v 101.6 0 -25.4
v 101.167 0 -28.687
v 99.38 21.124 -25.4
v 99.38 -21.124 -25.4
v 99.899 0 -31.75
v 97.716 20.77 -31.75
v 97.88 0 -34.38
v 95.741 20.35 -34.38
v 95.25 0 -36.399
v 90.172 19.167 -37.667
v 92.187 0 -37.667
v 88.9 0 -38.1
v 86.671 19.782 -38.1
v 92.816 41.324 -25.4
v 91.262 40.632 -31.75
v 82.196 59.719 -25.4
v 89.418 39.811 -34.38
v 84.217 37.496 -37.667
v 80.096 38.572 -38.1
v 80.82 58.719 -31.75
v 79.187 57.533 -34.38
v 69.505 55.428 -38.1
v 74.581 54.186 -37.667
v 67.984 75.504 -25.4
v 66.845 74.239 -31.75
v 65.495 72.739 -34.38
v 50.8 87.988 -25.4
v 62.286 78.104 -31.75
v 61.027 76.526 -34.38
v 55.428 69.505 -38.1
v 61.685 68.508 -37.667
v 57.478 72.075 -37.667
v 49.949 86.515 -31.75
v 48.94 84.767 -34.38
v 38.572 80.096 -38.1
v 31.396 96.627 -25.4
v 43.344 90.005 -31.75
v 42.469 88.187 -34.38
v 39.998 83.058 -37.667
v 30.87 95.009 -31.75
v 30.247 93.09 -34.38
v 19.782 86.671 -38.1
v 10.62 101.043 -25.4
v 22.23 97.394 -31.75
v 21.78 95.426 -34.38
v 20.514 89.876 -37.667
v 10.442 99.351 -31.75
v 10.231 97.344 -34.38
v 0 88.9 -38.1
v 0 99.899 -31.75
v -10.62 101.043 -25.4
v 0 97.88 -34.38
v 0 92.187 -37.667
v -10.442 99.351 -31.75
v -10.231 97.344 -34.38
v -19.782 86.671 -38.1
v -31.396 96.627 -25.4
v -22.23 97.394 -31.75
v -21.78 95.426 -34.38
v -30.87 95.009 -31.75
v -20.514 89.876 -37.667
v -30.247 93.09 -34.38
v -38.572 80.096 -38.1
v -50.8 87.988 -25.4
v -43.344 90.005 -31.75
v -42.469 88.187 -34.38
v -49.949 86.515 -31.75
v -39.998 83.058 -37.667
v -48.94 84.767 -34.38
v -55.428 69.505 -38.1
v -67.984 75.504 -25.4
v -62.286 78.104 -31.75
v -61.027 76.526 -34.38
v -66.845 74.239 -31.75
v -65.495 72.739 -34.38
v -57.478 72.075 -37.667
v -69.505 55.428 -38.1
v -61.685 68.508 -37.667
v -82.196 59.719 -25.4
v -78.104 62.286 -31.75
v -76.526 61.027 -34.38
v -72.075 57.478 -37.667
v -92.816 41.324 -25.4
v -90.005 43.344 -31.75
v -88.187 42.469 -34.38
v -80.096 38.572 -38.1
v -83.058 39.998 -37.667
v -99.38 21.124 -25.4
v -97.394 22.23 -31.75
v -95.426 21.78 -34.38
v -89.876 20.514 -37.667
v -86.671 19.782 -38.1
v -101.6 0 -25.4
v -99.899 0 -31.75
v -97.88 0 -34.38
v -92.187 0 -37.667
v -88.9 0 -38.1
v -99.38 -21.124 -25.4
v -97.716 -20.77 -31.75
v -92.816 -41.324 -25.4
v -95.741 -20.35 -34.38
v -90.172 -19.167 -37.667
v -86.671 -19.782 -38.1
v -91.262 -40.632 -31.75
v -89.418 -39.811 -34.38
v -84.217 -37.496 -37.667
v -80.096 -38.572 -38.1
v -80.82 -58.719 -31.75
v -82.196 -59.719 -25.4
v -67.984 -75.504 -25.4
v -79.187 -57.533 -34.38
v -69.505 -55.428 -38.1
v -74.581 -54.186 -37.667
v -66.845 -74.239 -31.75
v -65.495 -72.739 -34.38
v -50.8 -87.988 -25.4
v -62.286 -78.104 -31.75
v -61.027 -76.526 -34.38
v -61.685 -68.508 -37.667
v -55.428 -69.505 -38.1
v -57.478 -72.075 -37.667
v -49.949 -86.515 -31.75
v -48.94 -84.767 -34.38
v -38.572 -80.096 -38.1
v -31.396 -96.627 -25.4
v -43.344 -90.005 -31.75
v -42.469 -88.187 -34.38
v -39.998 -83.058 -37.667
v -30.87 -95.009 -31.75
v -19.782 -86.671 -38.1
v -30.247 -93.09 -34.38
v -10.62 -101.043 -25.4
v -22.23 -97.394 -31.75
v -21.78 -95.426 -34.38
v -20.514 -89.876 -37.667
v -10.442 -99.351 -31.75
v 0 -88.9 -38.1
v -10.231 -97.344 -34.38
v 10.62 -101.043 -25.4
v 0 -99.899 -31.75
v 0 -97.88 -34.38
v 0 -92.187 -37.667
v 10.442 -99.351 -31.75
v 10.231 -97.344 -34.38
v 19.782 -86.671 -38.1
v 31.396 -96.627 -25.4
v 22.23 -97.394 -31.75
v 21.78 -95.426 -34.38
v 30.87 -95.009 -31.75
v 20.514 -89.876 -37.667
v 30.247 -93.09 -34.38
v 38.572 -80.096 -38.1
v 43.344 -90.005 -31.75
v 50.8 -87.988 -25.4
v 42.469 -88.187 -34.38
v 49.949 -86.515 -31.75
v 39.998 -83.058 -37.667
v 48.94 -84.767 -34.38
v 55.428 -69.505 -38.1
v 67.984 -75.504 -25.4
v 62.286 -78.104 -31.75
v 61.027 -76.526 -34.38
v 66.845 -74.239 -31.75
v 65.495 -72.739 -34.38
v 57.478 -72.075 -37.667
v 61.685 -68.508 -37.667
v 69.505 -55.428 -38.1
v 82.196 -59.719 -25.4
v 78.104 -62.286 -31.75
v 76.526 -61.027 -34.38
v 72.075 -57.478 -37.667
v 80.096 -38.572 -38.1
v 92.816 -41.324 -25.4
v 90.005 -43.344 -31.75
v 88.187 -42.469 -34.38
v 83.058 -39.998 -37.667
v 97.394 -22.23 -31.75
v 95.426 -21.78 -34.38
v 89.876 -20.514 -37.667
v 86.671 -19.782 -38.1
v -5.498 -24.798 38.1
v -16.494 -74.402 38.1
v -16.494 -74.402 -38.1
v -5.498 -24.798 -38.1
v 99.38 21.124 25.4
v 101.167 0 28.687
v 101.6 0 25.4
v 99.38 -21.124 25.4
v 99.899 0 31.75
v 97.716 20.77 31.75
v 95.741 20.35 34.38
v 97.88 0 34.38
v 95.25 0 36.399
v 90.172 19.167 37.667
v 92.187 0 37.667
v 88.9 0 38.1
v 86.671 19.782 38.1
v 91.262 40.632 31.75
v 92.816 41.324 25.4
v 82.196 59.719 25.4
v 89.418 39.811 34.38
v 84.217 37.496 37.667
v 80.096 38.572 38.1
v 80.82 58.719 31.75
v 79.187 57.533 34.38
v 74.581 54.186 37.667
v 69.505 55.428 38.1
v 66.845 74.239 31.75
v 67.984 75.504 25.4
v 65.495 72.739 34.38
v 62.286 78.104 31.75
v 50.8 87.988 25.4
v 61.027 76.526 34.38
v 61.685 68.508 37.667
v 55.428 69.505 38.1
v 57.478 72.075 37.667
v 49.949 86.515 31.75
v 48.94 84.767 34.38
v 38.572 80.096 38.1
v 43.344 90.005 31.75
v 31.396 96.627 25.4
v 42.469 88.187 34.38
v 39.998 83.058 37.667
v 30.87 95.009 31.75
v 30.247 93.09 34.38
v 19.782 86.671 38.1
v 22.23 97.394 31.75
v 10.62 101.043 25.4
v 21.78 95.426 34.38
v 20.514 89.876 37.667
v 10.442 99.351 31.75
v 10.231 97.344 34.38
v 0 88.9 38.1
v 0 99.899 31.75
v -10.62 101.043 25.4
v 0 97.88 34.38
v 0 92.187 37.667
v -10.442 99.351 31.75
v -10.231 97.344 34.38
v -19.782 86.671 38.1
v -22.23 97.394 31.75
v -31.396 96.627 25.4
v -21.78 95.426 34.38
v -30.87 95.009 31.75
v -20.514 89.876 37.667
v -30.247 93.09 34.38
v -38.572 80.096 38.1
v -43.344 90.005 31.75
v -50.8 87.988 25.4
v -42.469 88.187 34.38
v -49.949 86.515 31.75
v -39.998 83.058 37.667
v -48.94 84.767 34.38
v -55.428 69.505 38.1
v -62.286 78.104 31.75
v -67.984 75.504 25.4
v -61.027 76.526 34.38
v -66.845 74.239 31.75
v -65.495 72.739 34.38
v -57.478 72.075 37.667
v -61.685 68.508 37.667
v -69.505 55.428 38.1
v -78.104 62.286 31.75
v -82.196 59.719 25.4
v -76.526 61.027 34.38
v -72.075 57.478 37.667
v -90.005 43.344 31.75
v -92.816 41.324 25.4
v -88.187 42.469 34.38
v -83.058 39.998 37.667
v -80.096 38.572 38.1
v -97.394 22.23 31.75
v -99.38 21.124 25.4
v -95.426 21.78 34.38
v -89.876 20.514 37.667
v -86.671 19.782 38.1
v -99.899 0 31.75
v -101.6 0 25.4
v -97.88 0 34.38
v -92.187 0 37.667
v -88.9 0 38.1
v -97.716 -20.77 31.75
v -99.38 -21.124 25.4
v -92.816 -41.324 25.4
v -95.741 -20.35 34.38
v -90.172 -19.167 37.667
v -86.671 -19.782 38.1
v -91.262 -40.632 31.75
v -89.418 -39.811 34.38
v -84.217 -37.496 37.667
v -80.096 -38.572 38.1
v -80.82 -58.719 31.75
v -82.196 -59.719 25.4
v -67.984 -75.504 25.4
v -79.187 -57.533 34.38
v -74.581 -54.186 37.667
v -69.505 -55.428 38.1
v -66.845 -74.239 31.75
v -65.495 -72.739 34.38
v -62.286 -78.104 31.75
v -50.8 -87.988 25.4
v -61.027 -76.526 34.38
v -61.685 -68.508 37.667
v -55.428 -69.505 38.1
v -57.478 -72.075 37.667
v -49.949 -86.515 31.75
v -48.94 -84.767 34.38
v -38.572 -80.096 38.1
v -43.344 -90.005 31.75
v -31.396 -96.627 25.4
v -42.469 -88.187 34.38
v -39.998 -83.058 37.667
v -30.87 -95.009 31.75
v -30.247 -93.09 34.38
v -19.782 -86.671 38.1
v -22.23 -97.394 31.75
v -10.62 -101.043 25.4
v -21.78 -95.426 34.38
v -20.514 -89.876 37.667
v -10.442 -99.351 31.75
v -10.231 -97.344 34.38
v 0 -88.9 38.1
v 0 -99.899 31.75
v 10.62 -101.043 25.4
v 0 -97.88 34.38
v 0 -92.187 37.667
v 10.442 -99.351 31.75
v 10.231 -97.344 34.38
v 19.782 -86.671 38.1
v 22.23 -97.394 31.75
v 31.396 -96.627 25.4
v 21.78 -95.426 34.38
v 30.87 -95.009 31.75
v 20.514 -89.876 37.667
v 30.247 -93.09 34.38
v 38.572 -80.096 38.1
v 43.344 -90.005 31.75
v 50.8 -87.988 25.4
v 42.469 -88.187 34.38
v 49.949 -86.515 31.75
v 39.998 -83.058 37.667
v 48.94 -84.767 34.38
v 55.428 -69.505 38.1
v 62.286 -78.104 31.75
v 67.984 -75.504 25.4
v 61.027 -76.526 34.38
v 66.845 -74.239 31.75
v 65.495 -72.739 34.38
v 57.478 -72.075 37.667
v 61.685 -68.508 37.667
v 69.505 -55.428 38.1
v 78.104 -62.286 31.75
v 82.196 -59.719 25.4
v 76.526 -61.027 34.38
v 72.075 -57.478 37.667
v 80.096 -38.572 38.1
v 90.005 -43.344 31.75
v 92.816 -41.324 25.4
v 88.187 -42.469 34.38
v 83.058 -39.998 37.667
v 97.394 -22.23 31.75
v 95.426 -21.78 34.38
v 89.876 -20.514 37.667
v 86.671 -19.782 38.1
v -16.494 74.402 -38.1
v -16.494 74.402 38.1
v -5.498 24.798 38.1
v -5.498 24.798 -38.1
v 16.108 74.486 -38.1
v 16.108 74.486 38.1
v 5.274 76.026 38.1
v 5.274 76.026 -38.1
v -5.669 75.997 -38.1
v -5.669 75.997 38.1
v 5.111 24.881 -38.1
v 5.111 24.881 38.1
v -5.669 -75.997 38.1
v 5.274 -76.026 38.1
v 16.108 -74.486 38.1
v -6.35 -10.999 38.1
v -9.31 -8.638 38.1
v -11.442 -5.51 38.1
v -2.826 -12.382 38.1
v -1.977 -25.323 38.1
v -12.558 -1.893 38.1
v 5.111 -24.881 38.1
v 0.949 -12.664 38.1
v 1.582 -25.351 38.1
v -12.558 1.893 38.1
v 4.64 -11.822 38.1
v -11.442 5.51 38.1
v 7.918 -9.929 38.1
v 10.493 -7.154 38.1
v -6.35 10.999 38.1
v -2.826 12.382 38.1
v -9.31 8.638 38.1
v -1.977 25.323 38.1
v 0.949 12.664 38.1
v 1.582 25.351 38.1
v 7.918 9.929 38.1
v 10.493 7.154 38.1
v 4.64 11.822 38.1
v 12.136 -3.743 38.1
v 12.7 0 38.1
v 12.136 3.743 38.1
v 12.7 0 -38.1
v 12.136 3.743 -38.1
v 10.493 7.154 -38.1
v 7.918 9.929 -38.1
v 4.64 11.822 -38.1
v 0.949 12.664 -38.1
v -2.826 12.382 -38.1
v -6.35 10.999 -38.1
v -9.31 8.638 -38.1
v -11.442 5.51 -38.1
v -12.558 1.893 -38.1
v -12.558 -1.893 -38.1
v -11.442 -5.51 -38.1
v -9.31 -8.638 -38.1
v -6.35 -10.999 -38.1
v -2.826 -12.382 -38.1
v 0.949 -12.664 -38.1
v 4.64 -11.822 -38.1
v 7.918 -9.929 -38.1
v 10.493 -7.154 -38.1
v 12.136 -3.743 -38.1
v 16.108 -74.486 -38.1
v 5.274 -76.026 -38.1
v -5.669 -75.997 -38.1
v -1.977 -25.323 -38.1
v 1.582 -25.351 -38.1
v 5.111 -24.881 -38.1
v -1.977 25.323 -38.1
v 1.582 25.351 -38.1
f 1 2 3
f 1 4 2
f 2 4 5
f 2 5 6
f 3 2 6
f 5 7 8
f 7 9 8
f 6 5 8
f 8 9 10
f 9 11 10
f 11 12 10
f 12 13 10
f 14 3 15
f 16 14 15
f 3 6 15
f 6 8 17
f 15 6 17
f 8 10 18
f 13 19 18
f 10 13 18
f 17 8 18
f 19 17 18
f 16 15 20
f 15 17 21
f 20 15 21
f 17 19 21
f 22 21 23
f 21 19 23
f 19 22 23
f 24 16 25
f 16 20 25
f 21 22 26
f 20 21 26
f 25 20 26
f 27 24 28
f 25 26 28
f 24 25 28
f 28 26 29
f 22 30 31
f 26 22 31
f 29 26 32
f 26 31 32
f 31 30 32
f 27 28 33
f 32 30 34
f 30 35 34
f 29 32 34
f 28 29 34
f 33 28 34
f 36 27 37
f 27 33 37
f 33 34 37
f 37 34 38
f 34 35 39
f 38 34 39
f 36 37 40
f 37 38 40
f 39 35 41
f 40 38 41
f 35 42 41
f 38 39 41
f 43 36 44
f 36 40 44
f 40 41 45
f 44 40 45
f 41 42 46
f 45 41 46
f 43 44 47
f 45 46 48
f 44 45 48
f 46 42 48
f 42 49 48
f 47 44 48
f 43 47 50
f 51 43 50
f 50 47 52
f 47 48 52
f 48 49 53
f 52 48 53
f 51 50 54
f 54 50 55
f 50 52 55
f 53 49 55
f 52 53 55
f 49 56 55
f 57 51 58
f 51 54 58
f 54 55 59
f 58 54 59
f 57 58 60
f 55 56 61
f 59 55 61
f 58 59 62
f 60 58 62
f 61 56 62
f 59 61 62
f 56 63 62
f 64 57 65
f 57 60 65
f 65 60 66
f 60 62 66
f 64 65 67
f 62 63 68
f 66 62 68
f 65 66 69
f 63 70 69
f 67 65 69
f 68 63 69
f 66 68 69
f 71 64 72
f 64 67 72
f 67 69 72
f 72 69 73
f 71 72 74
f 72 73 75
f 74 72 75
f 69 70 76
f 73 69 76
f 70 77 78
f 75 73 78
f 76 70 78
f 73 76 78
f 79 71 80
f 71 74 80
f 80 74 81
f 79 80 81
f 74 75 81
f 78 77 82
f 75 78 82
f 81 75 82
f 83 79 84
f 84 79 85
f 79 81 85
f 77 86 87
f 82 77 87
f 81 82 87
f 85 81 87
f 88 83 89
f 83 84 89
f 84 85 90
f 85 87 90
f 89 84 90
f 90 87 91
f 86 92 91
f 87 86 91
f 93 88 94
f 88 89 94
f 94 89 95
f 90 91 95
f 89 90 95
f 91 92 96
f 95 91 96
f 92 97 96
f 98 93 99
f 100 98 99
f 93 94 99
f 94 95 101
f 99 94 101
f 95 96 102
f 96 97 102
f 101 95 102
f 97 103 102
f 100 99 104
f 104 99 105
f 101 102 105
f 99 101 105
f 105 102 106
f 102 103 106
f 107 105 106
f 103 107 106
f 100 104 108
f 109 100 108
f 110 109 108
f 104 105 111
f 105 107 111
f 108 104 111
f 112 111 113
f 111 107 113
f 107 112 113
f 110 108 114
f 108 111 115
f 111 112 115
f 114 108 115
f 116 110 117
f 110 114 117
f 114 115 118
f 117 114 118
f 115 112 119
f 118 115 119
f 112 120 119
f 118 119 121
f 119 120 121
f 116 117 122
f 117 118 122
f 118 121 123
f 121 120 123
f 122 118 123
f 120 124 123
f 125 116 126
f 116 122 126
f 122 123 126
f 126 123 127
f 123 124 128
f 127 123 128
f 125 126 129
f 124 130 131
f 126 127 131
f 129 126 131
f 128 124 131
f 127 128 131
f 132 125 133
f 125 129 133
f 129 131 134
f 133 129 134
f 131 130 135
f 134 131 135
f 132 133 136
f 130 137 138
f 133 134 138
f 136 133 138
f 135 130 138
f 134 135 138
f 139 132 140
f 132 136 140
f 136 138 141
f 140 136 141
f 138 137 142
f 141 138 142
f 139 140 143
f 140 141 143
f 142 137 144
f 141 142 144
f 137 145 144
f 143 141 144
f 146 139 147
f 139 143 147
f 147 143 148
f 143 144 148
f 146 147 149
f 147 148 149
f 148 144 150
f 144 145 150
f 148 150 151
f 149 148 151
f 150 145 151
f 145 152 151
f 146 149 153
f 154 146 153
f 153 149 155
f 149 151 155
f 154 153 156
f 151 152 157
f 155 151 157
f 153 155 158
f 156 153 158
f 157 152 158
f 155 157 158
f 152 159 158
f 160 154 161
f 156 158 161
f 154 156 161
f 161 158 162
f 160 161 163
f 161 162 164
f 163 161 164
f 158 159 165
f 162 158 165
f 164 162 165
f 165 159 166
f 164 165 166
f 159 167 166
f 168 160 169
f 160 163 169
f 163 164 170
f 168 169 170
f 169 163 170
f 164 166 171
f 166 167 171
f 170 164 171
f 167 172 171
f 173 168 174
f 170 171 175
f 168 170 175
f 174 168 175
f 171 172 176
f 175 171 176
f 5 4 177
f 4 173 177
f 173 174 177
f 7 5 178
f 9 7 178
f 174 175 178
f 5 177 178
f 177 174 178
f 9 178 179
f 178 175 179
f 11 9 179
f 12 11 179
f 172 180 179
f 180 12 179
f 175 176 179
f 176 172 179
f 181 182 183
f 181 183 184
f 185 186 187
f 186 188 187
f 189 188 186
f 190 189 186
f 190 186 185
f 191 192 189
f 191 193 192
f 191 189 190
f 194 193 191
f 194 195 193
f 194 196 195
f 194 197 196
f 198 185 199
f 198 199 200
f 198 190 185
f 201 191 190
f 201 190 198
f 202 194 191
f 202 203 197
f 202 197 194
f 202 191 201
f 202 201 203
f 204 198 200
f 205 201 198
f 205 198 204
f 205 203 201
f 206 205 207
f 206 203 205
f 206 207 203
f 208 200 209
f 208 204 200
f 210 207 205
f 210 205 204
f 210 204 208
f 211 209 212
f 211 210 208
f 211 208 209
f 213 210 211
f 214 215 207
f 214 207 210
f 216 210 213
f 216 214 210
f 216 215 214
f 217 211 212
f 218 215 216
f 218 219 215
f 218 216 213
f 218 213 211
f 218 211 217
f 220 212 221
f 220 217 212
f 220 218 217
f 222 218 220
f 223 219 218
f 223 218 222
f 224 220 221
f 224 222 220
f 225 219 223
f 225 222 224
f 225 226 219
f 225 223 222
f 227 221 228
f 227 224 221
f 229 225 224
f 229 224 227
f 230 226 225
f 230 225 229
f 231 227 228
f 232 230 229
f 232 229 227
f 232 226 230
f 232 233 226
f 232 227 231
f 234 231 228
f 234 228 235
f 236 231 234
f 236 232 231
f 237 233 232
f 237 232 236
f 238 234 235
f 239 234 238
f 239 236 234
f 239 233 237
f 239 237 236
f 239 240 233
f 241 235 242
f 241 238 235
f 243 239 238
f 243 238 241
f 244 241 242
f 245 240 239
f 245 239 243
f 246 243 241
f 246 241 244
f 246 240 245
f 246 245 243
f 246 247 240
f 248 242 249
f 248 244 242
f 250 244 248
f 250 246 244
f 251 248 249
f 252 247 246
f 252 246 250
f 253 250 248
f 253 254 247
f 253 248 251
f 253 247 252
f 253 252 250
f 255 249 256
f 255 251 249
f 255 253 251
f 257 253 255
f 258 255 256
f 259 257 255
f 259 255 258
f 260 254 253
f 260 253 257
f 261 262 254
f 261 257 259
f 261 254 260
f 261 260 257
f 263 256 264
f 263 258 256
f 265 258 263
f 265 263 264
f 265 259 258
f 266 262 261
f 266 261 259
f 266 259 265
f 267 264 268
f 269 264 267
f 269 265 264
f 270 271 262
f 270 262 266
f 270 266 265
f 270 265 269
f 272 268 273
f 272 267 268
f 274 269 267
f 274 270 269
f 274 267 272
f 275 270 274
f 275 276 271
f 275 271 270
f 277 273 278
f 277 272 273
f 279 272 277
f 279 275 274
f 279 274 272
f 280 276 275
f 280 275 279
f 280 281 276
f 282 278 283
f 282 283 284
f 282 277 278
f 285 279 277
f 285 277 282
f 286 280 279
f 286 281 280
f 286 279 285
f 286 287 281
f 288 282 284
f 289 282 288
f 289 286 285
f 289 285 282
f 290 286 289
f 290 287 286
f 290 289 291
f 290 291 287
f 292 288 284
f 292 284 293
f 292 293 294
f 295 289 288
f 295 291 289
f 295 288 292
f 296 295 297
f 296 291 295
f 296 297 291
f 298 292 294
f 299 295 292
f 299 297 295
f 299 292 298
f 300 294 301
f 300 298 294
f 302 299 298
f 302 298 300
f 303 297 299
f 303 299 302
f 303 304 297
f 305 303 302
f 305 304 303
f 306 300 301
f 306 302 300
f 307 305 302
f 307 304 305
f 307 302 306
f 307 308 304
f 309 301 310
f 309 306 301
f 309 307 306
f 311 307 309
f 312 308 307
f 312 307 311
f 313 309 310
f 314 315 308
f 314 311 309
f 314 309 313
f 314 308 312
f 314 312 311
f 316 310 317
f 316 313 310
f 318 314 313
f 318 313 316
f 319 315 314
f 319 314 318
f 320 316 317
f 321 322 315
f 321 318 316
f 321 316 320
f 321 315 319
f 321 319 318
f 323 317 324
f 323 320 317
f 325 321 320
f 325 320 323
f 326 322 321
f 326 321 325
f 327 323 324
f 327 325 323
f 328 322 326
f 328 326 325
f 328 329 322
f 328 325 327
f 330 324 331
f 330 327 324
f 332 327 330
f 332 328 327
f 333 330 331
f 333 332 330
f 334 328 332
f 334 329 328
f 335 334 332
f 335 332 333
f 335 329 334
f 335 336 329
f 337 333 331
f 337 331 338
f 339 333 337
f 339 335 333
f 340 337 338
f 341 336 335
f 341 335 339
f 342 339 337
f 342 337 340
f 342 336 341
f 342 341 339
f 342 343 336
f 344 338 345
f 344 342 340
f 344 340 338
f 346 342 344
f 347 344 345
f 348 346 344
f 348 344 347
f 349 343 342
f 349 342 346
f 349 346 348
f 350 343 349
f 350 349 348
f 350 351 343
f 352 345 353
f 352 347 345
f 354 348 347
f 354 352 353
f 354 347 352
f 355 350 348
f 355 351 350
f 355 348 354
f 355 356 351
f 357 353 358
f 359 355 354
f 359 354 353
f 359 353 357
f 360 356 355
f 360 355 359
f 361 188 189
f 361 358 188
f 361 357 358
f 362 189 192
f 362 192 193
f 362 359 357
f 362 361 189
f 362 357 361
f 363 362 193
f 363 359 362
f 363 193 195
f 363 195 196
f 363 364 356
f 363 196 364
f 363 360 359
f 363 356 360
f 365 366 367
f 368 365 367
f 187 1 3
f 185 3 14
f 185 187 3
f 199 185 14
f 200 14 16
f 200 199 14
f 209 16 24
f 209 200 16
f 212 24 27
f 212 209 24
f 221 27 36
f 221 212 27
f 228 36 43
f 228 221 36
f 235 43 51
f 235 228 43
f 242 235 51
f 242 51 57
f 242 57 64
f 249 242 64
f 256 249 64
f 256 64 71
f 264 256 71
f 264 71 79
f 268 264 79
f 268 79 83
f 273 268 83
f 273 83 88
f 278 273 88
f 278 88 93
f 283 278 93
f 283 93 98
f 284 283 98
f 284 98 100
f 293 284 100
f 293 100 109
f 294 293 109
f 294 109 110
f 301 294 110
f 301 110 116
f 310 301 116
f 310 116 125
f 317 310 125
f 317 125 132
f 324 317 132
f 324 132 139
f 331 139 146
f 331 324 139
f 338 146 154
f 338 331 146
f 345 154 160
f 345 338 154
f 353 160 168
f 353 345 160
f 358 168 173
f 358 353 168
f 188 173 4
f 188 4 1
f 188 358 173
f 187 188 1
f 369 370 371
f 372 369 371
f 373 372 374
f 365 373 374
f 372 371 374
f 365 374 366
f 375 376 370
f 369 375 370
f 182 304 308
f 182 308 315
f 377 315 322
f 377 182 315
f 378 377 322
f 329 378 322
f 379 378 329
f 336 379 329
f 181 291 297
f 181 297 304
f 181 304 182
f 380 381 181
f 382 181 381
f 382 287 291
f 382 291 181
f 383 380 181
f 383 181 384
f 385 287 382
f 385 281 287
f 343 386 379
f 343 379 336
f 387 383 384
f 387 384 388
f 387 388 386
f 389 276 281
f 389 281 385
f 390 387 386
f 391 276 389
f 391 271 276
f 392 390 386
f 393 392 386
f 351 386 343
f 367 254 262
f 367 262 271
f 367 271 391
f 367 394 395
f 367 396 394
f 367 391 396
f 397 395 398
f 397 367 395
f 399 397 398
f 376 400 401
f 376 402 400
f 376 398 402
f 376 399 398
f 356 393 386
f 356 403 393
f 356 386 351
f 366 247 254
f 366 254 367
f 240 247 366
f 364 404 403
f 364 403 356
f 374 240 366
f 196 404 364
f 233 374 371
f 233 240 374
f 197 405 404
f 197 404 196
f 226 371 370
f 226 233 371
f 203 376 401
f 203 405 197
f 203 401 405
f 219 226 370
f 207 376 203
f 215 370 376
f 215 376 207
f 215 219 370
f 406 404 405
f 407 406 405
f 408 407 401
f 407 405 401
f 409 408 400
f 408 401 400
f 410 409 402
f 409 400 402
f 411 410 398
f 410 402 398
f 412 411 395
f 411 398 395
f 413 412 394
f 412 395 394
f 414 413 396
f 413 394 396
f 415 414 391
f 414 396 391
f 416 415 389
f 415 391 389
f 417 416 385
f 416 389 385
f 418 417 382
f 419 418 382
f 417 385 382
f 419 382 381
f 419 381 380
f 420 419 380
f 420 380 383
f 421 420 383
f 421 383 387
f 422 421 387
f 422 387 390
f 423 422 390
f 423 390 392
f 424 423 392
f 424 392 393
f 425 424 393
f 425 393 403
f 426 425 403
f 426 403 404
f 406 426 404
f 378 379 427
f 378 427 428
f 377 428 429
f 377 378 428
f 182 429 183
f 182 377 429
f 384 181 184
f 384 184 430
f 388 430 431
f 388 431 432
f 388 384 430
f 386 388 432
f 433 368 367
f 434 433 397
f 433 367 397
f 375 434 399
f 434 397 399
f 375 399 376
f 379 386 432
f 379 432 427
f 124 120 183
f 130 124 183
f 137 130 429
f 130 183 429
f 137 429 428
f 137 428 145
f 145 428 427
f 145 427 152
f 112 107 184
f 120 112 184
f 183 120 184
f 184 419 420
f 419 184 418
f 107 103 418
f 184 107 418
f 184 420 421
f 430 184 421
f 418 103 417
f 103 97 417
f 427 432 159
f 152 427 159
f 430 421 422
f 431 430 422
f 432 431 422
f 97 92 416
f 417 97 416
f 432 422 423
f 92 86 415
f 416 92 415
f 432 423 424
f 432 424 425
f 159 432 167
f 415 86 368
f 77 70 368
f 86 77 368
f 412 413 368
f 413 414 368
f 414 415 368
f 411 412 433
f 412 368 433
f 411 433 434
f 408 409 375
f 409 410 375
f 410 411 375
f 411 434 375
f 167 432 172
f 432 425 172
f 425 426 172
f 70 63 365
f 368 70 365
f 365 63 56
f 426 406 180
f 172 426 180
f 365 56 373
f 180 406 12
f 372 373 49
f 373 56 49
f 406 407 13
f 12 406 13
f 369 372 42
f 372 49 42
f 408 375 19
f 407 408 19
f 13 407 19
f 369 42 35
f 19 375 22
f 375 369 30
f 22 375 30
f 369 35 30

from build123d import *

# Parameters (mm, degrees)
BOSS_EXTRUDE1_DEPTH      = 38.1
BOSS_EXTRUDE1_DEPTH_BACK = 38.1
SKETCH1_R                = 101.6
SKETCH2_R                = 12.7
CUT_EXTRUDE1_DEPTH       = 163.639355631
FILLET1_R                = 12.7
FILLET2_R                = 12.7
CUT_EXTRUDE2_DEPTH       = 163.639355693


with BuildPart() as part:
    # Sketch1 → Boss-Extrude1 (new, two sides: drawn at the far end of the back side and taken through both)
    with BuildSketch(Plane.XY.offset(-BOSS_EXTRUDE1_DEPTH_BACK)):
        Circle(SKETCH1_R)
    extrude(amount=BOSS_EXTRUDE1_DEPTH + BOSS_EXTRUDE1_DEPTH_BACK)

    # Sketch2 → Cut-Extrude1 (cut, through all)
    with BuildSketch(Plane.XY.offset(38.1)):
        Circle(SKETCH2_R)
    extrude(amount=-CUT_EXTRUDE1_DEPTH, mode=Mode.SUBTRACT)

    # Fillet1
    fillet1_edges = [part.edges().sort_by_distance(p)[0] for p in [
        (-101.6, 0, 38.1),
    ]]
    fillet(fillet1_edges, radius=FILLET1_R)

    # Fillet2
    fillet2_edges = [part.edges().sort_by_distance(p)[0] for p in [
        (-101.6, 0, -38.1),
    ]]
    fillet(fillet2_edges, radius=FILLET2_R)

    # Sketch3 → Cut-Extrude2 (cut, through all)
    with BuildSketch(Plane.XY.offset(38.1)):
        with BuildLine():
            Line((5.110599479, 24.880550094), (16.107968661, 74.486476782))
            ThreePointArc((16.107968661, 74.486476782), (-0.197840063, 76.208022787), (-16.494490613, 74.401839071))
            Line((-16.494490613, 74.401839071), (-5.497566194, 24.797918581))
            ThreePointArc((-5.497566194, 24.797918581), (-0.197845398, 25.399229461), (5.110599479, 24.880550094))
        make_face()
    cut_extrude2 = extrude(amount=-CUT_EXTRUDE2_DEPTH, mode=Mode.SUBTRACT)

    # Mirror1: Cut-Extrude2 across plane
    add(cut_extrude2.mirror(Plane.ZX), mode=Mode.SUBTRACT)


solid = part.part
